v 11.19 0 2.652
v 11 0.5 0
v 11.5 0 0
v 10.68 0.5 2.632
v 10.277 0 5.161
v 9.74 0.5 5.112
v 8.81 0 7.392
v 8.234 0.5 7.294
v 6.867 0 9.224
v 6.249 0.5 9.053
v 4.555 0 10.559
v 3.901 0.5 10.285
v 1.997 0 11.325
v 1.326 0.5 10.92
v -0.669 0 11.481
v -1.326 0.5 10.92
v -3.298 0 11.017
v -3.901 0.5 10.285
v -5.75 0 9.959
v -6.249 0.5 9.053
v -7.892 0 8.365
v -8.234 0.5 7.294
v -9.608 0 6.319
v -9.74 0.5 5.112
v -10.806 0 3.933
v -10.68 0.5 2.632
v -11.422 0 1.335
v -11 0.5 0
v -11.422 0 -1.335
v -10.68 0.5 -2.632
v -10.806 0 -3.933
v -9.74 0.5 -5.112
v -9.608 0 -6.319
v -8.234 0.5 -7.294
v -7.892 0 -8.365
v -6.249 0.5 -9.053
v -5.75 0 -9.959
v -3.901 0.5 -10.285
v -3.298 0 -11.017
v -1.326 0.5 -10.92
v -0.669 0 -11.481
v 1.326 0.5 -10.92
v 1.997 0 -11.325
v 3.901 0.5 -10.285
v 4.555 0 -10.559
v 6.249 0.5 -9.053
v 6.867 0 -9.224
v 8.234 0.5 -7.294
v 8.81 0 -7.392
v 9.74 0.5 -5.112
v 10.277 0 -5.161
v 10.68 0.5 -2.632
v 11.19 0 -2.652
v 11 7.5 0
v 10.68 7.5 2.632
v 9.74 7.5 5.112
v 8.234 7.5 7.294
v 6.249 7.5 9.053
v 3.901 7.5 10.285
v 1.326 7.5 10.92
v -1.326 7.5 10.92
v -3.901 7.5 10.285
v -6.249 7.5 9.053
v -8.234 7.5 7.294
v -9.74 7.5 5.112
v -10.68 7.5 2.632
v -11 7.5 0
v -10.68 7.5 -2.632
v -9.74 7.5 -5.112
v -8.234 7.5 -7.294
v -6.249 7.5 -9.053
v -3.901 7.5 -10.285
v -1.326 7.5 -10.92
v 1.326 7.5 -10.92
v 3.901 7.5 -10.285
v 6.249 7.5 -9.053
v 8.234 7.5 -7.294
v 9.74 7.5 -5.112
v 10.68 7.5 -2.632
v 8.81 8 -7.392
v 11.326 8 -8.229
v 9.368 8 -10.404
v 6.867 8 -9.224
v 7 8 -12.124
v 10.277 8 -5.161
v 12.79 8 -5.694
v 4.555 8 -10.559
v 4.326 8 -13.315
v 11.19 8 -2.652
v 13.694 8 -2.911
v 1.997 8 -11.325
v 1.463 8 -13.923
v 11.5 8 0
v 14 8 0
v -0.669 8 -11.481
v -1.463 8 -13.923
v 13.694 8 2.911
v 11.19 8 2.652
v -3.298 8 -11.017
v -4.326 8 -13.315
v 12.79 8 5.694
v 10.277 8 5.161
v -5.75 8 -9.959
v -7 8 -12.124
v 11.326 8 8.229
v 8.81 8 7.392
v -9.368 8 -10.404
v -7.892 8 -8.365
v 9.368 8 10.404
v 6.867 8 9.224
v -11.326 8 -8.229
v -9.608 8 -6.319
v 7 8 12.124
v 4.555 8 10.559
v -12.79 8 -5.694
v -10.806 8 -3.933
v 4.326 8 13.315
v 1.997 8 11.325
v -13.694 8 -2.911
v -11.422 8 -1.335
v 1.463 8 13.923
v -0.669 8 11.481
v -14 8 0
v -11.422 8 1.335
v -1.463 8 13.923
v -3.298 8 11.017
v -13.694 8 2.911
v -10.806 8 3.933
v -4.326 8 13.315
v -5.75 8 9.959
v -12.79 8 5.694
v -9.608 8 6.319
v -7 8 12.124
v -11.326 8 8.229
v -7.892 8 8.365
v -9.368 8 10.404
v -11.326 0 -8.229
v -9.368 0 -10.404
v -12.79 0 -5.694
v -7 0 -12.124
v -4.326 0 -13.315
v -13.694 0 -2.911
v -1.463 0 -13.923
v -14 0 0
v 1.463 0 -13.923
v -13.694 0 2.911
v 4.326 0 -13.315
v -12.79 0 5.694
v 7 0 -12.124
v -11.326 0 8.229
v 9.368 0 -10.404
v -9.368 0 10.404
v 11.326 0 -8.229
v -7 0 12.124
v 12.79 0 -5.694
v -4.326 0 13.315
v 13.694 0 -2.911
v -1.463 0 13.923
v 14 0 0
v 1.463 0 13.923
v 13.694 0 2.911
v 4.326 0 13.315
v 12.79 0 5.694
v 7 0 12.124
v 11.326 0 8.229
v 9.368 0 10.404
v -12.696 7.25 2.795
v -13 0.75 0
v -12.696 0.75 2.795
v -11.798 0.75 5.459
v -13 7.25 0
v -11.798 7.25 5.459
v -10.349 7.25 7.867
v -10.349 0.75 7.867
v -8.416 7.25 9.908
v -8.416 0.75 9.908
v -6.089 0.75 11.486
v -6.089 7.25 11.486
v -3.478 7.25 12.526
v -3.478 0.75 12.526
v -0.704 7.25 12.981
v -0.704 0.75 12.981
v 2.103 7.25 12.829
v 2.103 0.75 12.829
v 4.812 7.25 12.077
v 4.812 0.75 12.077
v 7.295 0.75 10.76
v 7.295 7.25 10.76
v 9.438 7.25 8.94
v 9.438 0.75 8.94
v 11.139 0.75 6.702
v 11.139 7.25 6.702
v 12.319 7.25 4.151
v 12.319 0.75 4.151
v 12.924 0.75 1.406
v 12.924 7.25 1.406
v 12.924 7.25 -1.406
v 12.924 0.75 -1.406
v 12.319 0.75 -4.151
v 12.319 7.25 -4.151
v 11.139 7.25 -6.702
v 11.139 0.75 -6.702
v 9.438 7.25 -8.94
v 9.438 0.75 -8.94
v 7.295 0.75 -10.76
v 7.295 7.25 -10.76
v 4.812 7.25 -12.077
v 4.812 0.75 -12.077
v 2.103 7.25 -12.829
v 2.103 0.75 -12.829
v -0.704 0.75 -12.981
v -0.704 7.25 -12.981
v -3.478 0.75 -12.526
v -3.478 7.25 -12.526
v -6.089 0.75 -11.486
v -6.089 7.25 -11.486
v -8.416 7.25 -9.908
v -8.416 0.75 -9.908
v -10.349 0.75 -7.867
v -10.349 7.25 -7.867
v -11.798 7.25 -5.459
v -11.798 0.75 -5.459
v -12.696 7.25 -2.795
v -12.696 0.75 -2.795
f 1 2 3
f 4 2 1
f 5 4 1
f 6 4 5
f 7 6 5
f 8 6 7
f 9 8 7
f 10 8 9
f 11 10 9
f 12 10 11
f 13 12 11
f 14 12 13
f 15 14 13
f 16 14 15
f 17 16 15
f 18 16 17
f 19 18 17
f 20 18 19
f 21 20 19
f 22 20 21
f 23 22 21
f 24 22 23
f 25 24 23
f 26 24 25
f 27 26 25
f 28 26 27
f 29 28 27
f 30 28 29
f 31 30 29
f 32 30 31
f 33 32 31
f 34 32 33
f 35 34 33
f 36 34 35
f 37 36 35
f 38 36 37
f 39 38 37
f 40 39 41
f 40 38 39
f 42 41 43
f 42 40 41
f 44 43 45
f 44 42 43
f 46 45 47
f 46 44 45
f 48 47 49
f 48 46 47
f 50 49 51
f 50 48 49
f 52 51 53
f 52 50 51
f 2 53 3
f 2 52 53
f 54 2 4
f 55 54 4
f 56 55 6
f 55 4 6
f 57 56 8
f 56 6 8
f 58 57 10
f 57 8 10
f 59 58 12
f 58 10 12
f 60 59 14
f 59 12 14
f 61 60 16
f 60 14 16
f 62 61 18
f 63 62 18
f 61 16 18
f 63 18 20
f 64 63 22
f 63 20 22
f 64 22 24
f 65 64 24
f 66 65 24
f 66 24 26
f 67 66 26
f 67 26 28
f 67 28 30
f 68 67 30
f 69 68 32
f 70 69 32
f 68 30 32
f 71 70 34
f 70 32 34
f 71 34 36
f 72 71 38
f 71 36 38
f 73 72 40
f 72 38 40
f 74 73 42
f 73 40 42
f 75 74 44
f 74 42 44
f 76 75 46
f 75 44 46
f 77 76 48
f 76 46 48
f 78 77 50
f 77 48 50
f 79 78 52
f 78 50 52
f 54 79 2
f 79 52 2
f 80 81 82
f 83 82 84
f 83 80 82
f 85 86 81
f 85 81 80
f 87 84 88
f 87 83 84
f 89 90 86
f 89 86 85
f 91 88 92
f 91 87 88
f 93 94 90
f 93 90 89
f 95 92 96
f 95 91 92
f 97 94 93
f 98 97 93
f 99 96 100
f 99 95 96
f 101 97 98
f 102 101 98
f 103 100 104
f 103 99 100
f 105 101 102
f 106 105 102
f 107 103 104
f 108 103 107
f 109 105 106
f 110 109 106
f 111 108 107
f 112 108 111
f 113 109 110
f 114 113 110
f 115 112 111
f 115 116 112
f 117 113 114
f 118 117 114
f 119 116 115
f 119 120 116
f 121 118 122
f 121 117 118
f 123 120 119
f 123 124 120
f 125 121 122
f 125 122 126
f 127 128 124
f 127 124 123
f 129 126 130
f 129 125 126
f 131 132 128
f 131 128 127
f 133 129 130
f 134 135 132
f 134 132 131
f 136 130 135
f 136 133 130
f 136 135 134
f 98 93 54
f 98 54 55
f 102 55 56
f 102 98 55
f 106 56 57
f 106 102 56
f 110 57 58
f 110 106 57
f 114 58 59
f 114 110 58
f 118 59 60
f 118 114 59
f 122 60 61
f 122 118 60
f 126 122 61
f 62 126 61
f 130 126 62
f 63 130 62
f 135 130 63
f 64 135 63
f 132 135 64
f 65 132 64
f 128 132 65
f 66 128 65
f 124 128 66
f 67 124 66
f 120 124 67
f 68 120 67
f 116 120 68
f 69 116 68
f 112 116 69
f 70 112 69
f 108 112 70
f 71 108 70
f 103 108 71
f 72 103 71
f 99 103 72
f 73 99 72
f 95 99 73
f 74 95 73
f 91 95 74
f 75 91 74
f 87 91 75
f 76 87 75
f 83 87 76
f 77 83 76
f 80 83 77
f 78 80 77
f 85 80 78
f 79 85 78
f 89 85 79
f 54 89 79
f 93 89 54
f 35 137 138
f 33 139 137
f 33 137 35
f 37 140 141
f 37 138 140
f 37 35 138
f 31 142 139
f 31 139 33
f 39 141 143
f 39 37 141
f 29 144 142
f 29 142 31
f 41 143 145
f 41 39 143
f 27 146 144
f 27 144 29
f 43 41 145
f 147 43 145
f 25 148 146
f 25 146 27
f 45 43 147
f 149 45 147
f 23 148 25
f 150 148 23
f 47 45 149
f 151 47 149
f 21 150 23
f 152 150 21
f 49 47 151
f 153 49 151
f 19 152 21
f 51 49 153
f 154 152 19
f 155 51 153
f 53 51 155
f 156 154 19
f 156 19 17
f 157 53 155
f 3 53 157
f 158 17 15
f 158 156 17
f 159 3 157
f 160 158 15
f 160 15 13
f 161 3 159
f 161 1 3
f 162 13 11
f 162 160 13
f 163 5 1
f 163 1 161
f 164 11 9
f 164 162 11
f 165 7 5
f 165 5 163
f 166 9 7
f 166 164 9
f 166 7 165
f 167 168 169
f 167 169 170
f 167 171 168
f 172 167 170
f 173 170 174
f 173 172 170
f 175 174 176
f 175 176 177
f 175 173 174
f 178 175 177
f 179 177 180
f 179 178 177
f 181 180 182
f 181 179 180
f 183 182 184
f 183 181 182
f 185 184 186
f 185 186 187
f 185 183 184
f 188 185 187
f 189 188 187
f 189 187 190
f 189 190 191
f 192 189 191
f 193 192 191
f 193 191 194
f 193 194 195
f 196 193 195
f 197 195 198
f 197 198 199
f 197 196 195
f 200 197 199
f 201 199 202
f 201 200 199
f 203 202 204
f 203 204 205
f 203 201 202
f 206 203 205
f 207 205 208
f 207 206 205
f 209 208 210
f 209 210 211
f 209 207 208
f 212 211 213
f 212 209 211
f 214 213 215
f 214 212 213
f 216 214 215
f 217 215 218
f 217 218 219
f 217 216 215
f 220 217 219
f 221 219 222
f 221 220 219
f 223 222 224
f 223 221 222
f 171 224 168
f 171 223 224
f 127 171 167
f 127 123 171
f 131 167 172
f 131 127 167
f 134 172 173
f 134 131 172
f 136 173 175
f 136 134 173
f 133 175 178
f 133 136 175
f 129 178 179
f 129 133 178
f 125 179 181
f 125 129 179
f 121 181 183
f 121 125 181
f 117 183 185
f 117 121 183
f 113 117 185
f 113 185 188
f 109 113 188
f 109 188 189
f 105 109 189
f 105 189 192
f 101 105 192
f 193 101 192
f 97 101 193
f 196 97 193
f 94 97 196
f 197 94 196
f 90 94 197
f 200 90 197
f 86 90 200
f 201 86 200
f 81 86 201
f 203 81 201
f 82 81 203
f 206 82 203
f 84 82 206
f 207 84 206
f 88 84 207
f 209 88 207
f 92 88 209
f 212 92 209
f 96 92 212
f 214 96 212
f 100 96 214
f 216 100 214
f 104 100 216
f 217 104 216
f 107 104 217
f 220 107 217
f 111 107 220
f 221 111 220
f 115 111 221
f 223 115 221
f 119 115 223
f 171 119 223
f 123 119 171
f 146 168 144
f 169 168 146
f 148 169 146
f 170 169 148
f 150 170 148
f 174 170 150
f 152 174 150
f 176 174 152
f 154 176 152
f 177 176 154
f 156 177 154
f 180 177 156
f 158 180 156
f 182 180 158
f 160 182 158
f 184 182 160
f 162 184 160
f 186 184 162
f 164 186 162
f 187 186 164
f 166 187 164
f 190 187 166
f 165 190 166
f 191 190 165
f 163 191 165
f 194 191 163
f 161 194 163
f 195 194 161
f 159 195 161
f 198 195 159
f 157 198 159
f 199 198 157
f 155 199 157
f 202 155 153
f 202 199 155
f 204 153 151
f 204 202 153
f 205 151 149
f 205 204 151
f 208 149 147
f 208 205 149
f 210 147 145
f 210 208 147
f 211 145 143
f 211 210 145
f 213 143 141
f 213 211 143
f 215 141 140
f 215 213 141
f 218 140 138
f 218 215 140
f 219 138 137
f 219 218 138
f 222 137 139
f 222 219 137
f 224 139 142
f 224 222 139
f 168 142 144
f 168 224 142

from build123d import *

# Parameters (mm, degrees)
SKETCH001_R  = 11
POCKET_DEPTH = 8
CHAMFER_SIZE = 0.5


with BuildPart() as part:
    # Sketch → Revolution (revolve)
    with BuildSketch(Plane.XY):
        Polygon((0, 0), (-14, 0), (-13, 0.75), (-13, 7.25), (-14, 8), (0, 8), align=None)
    revolve(axis=Axis((0, 0, 0), (0, 1, 0)))

    # Sketch001 (on Face1 of Revolution) → Pocket (cut)
    with BuildSketch(Plane.XZ):
        Circle(SKETCH001_R)
    extrude(amount=-POCKET_DEPTH, mode=Mode.SUBTRACT)

    # Chamfer
    chamfer_edges = [part.edges().sort_by_distance(p)[0] for p in [
        (-11, 0, 0),
        (-11, 8, 0),
    ]]
    chamfer(chamfer_edges, length=CHAMFER_SIZE)


solid = part.part
